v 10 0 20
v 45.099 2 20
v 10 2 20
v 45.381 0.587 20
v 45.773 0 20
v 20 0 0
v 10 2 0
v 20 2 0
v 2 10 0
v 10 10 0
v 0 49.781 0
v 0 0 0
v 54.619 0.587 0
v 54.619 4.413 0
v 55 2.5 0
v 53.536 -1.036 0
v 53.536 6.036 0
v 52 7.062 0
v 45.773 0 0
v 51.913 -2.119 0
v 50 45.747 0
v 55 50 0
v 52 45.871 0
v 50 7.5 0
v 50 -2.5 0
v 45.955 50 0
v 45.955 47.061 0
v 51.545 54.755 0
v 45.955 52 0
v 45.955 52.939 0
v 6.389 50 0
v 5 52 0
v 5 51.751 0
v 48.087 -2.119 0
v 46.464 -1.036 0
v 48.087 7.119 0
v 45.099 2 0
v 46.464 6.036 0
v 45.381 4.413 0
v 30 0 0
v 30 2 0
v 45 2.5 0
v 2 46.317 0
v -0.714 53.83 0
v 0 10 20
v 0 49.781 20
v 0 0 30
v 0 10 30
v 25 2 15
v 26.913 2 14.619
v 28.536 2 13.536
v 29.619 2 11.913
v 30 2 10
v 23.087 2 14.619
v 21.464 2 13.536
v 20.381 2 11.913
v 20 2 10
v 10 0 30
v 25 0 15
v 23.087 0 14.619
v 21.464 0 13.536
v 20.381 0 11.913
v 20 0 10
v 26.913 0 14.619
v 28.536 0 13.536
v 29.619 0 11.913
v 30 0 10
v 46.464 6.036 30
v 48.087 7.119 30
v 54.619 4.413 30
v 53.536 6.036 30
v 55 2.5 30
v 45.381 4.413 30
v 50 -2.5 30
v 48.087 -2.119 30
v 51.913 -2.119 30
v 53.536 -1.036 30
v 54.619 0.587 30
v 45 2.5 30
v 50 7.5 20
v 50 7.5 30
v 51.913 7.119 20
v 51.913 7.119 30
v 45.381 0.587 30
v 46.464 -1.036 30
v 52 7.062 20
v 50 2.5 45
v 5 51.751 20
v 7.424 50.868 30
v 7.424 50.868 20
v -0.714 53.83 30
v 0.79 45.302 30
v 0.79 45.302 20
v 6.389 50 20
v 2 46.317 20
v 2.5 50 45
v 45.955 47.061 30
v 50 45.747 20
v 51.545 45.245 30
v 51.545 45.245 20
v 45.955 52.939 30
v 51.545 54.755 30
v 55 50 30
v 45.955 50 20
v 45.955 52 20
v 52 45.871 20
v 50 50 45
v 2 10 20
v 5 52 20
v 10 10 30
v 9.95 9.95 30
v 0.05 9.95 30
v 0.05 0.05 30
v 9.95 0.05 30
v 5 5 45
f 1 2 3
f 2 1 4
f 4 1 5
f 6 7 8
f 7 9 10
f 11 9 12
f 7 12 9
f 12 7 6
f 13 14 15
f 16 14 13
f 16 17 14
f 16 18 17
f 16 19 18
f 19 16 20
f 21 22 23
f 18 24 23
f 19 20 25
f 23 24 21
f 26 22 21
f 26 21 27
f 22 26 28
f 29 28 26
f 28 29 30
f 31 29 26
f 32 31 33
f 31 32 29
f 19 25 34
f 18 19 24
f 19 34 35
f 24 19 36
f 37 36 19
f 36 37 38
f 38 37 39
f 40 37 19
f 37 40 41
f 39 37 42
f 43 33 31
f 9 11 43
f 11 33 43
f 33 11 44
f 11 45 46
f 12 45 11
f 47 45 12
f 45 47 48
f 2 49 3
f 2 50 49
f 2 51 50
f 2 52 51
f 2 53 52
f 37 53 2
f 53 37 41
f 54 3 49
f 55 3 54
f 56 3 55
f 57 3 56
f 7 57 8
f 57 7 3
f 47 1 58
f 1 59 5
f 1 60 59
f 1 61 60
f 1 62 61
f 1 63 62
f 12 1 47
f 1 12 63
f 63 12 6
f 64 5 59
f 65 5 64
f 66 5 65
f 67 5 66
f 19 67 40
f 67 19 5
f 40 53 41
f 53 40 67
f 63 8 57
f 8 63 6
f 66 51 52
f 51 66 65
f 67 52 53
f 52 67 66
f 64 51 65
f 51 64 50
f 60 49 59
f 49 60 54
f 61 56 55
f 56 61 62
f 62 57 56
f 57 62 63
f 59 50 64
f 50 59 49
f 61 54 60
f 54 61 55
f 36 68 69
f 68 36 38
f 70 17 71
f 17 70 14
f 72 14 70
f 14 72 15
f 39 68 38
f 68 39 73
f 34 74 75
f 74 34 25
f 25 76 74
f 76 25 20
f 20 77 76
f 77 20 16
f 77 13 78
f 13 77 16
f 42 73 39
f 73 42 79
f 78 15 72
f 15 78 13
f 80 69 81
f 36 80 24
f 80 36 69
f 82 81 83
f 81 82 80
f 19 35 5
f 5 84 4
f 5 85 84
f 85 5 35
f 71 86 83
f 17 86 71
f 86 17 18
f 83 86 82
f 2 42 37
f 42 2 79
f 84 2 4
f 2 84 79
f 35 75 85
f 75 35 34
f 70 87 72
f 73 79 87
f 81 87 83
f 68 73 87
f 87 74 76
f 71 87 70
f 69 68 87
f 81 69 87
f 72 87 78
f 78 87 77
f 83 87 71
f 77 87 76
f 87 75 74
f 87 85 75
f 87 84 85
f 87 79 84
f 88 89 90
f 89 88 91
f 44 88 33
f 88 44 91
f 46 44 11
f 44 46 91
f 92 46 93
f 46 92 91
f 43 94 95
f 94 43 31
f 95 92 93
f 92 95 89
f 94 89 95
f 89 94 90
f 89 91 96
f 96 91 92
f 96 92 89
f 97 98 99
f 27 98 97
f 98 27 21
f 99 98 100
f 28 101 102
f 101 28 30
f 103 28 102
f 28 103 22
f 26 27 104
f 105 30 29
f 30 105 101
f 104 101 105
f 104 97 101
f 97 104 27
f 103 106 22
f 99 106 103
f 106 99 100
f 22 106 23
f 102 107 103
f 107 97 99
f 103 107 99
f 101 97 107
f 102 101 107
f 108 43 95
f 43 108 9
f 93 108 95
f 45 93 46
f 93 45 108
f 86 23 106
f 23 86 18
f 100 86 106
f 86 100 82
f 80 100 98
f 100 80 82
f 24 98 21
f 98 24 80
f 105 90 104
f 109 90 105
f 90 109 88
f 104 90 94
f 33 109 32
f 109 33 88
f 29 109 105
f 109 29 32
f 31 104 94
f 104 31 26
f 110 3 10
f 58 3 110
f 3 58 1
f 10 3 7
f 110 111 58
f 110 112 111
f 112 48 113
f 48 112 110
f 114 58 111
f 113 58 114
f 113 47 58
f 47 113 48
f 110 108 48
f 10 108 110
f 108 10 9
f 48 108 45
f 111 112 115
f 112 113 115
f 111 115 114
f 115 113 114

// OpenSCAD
/* [Parameters] */

circularTowerHeight = 30;
squareTowerHeight = 30;
triangleTowerHeight = 30;
pentagonTowerHeight = 30;

/* [Hidden] */
//walls
cube([2,50,20]);

translate([50,5,0])
	cube([2,47,20]);

translate([5,50,0])
	cube([47,2,20]);
////////////////////////////////////////////////////////////
//Gate
difference()
{
cube([50,2,20]);
translate([20,0,0])
	cube([10,2,10]);

translate([25,2.5,10])
	rotate([90,0,0])
		cylinder(r1=5,r2=5,h=4,$fn=0);
}
////////////////////////////////////////////////////////////
//Circular Tower
translate([50,2.5,0])
{
	cylinder(r1=5,r2=5,h=circularTowerHeight,$fn=0);
	translate([0,0,circularTowerHeight])
		cylinder(r1=5,r2=0,h=15,$fn=0);	
}

////////////////////////////////////////////////////////////
//triangle tower
translate([2.5,50,0])
{
	rotate([0,0,10])
	cylinder(r1=5,r2=5,triangleTowerHeight,$fn=3);	
	
	rotate([0,0,10])
	translate([0,0,triangleTowerHeight])
	cylinder(r1=5,r2=0,h=15,$fn=3);
}
////////////////////////////////////////////////////////////
//Pentagon tower
translate([50,50,0])
{
	cylinder(r1=5,r2=5,pentagonTowerHeight,$fn=5);
	translate([0,0,pentagonTowerHeight])
		cylinder(r1=5,r2=0,h=15,$fn=5);
}
////////////////////////////////////////////////////////////
//square tower
{
cube([10,10,squareTowerHeight]);

translate([5,5,squareTowerHeight])
	rotate([0,0,45])	
		cylinder(r1=7,r2=0,h=15,$fn=4);
}
